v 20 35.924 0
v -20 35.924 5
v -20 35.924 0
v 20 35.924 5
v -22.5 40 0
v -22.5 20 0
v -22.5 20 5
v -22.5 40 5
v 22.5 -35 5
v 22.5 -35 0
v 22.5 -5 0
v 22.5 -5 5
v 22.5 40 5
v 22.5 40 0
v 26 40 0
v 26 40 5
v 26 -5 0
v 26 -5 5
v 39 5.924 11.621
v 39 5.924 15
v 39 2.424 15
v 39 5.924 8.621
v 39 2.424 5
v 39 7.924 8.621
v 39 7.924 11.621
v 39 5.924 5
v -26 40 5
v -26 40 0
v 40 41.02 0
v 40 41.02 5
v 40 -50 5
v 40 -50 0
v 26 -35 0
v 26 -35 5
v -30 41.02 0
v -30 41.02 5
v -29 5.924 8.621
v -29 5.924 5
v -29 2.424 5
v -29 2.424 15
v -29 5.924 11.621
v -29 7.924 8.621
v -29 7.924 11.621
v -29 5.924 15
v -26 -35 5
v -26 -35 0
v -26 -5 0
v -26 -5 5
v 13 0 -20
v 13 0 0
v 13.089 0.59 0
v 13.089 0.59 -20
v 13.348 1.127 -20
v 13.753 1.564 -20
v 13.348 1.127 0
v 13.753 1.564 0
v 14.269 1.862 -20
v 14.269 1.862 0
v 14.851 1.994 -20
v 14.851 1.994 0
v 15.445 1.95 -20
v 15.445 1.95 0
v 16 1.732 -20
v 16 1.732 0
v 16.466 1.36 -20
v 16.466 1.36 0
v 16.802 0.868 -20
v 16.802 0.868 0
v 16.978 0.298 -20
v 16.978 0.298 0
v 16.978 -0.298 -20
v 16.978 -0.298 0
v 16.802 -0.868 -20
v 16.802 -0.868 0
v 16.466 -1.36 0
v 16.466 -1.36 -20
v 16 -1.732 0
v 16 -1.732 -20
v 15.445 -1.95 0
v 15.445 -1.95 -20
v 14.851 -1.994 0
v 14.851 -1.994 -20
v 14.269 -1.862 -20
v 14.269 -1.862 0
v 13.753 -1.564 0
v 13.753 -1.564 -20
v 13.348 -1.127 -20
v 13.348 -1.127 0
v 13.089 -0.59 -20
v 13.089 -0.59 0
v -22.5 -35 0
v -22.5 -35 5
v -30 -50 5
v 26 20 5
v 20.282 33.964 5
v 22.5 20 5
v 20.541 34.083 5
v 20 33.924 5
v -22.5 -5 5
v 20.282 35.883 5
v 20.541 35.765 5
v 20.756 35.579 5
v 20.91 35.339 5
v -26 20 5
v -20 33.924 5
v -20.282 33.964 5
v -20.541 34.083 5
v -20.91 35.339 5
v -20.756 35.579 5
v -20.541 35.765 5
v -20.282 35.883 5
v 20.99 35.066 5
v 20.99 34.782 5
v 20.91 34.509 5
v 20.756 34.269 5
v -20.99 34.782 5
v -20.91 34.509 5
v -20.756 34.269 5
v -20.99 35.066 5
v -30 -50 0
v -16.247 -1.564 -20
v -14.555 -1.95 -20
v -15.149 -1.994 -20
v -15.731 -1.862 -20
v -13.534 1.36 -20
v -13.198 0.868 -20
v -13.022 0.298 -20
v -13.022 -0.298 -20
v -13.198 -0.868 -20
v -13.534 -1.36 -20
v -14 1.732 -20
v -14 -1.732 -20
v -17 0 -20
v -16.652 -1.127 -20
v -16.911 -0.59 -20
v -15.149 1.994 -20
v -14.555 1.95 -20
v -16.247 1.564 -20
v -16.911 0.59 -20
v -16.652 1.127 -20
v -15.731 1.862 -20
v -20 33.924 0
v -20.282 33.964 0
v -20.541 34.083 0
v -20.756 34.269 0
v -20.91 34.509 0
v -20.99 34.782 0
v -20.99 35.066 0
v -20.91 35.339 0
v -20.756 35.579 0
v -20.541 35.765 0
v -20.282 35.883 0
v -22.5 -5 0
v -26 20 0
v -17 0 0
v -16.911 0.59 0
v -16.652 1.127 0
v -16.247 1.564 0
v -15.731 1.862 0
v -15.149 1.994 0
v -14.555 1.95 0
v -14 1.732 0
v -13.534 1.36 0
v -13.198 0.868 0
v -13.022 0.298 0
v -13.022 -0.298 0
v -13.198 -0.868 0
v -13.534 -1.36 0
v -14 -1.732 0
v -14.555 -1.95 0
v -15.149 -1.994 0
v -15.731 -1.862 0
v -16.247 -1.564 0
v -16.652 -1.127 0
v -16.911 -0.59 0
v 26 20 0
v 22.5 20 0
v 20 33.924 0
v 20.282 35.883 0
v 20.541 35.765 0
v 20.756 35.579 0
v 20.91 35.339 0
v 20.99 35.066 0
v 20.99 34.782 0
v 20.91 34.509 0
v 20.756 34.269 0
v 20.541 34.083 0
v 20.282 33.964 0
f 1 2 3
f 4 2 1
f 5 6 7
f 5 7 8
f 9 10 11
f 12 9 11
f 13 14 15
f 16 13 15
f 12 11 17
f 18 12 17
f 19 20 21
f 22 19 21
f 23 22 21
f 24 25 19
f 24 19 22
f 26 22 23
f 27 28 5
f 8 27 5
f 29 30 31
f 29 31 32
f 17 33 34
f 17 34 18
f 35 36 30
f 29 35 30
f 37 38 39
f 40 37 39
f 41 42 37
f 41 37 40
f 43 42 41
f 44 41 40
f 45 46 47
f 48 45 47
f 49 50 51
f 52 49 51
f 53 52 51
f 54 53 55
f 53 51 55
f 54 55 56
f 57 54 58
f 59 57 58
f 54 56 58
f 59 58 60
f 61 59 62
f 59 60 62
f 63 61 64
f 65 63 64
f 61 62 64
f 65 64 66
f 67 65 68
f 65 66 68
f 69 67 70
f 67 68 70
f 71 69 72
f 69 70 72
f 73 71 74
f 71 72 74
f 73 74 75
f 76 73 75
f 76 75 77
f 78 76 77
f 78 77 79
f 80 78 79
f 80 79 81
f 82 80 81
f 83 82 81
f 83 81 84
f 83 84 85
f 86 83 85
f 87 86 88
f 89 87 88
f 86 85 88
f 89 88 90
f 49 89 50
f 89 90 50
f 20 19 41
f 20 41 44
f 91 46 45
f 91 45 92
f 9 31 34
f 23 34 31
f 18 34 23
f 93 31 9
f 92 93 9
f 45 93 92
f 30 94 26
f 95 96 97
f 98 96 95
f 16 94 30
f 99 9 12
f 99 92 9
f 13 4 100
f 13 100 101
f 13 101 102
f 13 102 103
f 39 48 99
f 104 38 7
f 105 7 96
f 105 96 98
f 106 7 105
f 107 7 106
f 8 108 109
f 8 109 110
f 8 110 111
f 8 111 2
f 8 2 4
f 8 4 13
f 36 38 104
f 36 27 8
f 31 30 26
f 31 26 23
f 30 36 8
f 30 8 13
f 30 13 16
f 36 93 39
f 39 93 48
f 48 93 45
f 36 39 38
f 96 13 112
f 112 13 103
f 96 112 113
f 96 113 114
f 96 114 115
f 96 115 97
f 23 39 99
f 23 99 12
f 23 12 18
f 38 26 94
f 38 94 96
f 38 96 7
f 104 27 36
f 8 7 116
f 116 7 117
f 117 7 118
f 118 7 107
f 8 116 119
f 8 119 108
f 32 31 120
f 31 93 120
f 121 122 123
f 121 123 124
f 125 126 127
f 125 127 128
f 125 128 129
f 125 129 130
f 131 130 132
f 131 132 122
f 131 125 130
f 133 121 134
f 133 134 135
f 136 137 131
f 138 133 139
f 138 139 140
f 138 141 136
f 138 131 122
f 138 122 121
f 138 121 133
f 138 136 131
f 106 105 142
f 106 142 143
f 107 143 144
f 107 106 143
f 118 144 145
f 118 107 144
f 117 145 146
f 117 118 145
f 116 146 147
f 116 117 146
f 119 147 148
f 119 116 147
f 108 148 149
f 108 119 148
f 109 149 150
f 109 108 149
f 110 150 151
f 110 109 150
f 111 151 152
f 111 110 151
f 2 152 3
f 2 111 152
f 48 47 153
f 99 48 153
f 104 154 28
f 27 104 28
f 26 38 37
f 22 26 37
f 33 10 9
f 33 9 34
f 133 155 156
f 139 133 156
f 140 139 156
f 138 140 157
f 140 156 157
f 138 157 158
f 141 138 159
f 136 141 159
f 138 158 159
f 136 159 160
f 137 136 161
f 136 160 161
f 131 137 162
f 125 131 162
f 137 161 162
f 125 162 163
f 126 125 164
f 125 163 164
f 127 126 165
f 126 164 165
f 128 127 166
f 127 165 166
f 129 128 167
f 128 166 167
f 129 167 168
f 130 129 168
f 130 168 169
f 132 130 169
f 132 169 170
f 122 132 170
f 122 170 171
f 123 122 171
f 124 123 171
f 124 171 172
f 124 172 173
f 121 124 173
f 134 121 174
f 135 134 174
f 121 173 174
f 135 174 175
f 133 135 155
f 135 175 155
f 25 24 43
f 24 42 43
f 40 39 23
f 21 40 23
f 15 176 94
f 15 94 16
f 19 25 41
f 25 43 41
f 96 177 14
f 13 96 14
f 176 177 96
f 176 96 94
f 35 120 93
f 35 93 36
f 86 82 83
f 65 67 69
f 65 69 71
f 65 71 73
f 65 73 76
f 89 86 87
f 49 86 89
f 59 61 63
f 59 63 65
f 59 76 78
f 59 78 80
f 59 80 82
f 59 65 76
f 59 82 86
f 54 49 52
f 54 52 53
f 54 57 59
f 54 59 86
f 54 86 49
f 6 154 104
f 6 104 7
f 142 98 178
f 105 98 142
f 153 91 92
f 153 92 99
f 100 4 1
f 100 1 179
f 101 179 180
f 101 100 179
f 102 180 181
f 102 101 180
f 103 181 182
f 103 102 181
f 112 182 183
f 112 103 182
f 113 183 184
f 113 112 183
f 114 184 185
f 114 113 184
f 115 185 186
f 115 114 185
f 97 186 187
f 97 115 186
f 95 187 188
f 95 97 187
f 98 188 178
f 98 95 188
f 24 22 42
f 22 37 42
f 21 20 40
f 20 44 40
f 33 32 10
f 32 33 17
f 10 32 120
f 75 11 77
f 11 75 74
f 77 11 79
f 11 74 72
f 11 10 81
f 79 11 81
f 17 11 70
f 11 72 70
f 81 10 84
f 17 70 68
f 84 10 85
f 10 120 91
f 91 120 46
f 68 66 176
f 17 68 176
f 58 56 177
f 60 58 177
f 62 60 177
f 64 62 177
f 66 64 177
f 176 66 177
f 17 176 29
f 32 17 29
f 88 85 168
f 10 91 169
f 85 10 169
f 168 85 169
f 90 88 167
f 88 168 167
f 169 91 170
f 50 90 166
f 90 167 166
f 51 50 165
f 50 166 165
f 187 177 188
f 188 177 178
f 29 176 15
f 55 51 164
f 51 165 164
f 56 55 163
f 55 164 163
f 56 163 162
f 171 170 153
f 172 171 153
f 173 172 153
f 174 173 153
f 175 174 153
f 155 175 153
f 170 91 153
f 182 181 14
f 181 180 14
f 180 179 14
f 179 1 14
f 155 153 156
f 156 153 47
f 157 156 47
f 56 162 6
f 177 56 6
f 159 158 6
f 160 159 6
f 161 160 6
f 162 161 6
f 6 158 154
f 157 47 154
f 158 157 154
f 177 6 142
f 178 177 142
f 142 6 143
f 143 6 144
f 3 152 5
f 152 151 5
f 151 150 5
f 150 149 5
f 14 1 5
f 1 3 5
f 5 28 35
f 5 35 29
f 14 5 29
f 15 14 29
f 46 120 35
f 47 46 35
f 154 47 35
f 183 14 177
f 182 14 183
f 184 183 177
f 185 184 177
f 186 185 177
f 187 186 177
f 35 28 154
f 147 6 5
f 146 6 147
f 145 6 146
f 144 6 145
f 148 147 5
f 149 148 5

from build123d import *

# Parameters (mm, degrees)
SKETCH1_W           = 60
SKETCH1_H           = 100
SKETCH1_W_2         = 3.5
SKETCH1_H_2         = 30
SKETCH1_H_3         = 20
BOSS_EXTRUDE1_DEPTH = 5
SKETCH2_W           = 58
SKETCH2_H           = 3.5
BOSS_EXTRUDE2_DEPTH = 10
SKETCH3_W           = 52
SKETCH3_H           = 3
BOSS_EXTRUDE3_DEPTH = 2
SKETCH4_R           = 2
BOSS_EXTRUDE4_DEPTH = 20
CUT_EXTRUDE1_DEPTH  = 64.442887702
SKETCH6_W           = 3
SKETCH6_H           = 2
BOSS_EXTRUDE5_DEPTH = 3
SKETCH7_W           = 3
SKETCH7_H           = 2
BOSS_EXTRUDE6_DEPTH = 3
SKETCH8_W           = 5
SKETCH8_H           = 100
BOSS_EXTRUDE7_DEPTH = 10
BOSS_EXTRUDE8_DEPTH = 10
SKETCH11_W          = 70
SKETCH11_H          = 8.980295192
CUT_EXTRUDE2_DEPTH  = 69.738635424


with BuildPart() as part:
    # Sketch1 → Boss-Extrude1 (new body)
    with BuildSketch(Plane.XY):
        Rectangle(SKETCH1_W, SKETCH1_H)
        with Locations((24.25, -20)):
            Rectangle(SKETCH1_W_2, SKETCH1_H_2, mode=Mode.SUBTRACT)
        with Locations((-24.25, -20)):
            Rectangle(SKETCH1_W_2, SKETCH1_H_2, mode=Mode.SUBTRACT)
        with Locations((24.25, 30)):
            Rectangle(SKETCH1_W_2, SKETCH1_H_3, mode=Mode.SUBTRACT)
        with Locations((-24.25, 30)):
            Rectangle(SKETCH1_W_2, SKETCH1_H_3, mode=Mode.SUBTRACT)
    extrude(amount=BOSS_EXTRUDE1_DEPTH)

    # Sketch2 → Boss-Extrude2 (add)
    with BuildSketch(Plane.XY.offset(5)):
        with Locations((0, 4.173976932)):
            Rectangle(SKETCH2_W, SKETCH2_H)
    extrude(amount=BOSS_EXTRUDE2_DEPTH)

    # Sketch3 → Boss-Extrude3 (add)
    with BuildSketch(Plane(origin=(0, 5.923976932, 0), x_dir=(1, 0, 0), z_dir=(0, 1, 0))):
        with Locations((0, -10.12126967)):
            Rectangle(SKETCH3_W, SKETCH3_H)
    extrude(amount=BOSS_EXTRUDE3_DEPTH)

    # Sketch4 → Boss-Extrude4 (add)
    with BuildSketch(Plane(origin=(0, 0, 0), x_dir=(-1, 0, 0), z_dir=(0, 0, -1))):
        with Locations((15, 0)):
            Circle(SKETCH4_R)
        with Locations((-15, 0)):
            Circle(SKETCH4_R)
    extrude(amount=BOSS_EXTRUDE4_DEPTH)

    # Sketch5 → Cut-Extrude1 (cut, through all)
    with BuildSketch(Plane.XY.offset(5)):
        with BuildLine():
            Line((-20, 35.923976932), (20, 35.923976932))
            ThreePointArc((20, 35.923976932), (21, 34.923976932), (20, 33.923976932))
            Line((20, 33.923976932), (-20, 33.923976932))
            ThreePointArc((-20, 33.923976932), (-21, 34.923976932), (-20, 35.923976932))
        make_face()
    extrude(amount=-CUT_EXTRUDE1_DEPTH, mode=Mode.SUBTRACT)

    # Sketch6 → Boss-Extrude5 (add)
    with BuildSketch(Plane(origin=(26, 0, 0), x_dir=(0, 0, -1), z_dir=(1, 0, 0))):
        with Locations((-10.12126967, 6.923976932)):
            Rectangle(SKETCH6_W, SKETCH6_H)
    extrude(amount=BOSS_EXTRUDE5_DEPTH)

    # Sketch7 → Boss-Extrude6 (add)
    with BuildSketch(Plane.ZY.offset(26)):
        with Locations((10.12126967, 6.923976932)):
            Rectangle(SKETCH7_W, SKETCH7_H)
    extrude(amount=BOSS_EXTRUDE6_DEPTH)

    # Sketch8 → Boss-Extrude7 (add)
    with BuildSketch(Plane(origin=(30, 0, 0), x_dir=(0, 0, -1), z_dir=(1, 0, 0))):
        with Locations((-2.5, 0)):
            Rectangle(SKETCH8_W, SKETCH8_H)
    extrude(amount=BOSS_EXTRUDE7_DEPTH)

    # Sketch9 → Boss-Extrude8 (add)
    with BuildSketch(Plane(origin=(29, 0, 0), x_dir=(0, 0, -1), z_dir=(1, 0, 0))):
        Polygon((-5, 2.423976932), (-5, 5.923976932), (-8.62126967, 5.923976932), (-8.62126967, 7.923976932), (-11.62126967, 7.923976932), (-11.62126967, 5.923976932), (-15, 5.923976932), (-15, 2.423976932), align=None)
    extrude(amount=BOSS_EXTRUDE8_DEPTH)

    # Sketch11 → Cut-Extrude2 (cut, through all)
    with BuildSketch(Plane.XY.offset(5)):
        with Locations((5, 45.509852404)):
            Rectangle(SKETCH11_W, SKETCH11_H)
    extrude(amount=-CUT_EXTRUDE2_DEPTH, mode=Mode.SUBTRACT)


solid = part.part
